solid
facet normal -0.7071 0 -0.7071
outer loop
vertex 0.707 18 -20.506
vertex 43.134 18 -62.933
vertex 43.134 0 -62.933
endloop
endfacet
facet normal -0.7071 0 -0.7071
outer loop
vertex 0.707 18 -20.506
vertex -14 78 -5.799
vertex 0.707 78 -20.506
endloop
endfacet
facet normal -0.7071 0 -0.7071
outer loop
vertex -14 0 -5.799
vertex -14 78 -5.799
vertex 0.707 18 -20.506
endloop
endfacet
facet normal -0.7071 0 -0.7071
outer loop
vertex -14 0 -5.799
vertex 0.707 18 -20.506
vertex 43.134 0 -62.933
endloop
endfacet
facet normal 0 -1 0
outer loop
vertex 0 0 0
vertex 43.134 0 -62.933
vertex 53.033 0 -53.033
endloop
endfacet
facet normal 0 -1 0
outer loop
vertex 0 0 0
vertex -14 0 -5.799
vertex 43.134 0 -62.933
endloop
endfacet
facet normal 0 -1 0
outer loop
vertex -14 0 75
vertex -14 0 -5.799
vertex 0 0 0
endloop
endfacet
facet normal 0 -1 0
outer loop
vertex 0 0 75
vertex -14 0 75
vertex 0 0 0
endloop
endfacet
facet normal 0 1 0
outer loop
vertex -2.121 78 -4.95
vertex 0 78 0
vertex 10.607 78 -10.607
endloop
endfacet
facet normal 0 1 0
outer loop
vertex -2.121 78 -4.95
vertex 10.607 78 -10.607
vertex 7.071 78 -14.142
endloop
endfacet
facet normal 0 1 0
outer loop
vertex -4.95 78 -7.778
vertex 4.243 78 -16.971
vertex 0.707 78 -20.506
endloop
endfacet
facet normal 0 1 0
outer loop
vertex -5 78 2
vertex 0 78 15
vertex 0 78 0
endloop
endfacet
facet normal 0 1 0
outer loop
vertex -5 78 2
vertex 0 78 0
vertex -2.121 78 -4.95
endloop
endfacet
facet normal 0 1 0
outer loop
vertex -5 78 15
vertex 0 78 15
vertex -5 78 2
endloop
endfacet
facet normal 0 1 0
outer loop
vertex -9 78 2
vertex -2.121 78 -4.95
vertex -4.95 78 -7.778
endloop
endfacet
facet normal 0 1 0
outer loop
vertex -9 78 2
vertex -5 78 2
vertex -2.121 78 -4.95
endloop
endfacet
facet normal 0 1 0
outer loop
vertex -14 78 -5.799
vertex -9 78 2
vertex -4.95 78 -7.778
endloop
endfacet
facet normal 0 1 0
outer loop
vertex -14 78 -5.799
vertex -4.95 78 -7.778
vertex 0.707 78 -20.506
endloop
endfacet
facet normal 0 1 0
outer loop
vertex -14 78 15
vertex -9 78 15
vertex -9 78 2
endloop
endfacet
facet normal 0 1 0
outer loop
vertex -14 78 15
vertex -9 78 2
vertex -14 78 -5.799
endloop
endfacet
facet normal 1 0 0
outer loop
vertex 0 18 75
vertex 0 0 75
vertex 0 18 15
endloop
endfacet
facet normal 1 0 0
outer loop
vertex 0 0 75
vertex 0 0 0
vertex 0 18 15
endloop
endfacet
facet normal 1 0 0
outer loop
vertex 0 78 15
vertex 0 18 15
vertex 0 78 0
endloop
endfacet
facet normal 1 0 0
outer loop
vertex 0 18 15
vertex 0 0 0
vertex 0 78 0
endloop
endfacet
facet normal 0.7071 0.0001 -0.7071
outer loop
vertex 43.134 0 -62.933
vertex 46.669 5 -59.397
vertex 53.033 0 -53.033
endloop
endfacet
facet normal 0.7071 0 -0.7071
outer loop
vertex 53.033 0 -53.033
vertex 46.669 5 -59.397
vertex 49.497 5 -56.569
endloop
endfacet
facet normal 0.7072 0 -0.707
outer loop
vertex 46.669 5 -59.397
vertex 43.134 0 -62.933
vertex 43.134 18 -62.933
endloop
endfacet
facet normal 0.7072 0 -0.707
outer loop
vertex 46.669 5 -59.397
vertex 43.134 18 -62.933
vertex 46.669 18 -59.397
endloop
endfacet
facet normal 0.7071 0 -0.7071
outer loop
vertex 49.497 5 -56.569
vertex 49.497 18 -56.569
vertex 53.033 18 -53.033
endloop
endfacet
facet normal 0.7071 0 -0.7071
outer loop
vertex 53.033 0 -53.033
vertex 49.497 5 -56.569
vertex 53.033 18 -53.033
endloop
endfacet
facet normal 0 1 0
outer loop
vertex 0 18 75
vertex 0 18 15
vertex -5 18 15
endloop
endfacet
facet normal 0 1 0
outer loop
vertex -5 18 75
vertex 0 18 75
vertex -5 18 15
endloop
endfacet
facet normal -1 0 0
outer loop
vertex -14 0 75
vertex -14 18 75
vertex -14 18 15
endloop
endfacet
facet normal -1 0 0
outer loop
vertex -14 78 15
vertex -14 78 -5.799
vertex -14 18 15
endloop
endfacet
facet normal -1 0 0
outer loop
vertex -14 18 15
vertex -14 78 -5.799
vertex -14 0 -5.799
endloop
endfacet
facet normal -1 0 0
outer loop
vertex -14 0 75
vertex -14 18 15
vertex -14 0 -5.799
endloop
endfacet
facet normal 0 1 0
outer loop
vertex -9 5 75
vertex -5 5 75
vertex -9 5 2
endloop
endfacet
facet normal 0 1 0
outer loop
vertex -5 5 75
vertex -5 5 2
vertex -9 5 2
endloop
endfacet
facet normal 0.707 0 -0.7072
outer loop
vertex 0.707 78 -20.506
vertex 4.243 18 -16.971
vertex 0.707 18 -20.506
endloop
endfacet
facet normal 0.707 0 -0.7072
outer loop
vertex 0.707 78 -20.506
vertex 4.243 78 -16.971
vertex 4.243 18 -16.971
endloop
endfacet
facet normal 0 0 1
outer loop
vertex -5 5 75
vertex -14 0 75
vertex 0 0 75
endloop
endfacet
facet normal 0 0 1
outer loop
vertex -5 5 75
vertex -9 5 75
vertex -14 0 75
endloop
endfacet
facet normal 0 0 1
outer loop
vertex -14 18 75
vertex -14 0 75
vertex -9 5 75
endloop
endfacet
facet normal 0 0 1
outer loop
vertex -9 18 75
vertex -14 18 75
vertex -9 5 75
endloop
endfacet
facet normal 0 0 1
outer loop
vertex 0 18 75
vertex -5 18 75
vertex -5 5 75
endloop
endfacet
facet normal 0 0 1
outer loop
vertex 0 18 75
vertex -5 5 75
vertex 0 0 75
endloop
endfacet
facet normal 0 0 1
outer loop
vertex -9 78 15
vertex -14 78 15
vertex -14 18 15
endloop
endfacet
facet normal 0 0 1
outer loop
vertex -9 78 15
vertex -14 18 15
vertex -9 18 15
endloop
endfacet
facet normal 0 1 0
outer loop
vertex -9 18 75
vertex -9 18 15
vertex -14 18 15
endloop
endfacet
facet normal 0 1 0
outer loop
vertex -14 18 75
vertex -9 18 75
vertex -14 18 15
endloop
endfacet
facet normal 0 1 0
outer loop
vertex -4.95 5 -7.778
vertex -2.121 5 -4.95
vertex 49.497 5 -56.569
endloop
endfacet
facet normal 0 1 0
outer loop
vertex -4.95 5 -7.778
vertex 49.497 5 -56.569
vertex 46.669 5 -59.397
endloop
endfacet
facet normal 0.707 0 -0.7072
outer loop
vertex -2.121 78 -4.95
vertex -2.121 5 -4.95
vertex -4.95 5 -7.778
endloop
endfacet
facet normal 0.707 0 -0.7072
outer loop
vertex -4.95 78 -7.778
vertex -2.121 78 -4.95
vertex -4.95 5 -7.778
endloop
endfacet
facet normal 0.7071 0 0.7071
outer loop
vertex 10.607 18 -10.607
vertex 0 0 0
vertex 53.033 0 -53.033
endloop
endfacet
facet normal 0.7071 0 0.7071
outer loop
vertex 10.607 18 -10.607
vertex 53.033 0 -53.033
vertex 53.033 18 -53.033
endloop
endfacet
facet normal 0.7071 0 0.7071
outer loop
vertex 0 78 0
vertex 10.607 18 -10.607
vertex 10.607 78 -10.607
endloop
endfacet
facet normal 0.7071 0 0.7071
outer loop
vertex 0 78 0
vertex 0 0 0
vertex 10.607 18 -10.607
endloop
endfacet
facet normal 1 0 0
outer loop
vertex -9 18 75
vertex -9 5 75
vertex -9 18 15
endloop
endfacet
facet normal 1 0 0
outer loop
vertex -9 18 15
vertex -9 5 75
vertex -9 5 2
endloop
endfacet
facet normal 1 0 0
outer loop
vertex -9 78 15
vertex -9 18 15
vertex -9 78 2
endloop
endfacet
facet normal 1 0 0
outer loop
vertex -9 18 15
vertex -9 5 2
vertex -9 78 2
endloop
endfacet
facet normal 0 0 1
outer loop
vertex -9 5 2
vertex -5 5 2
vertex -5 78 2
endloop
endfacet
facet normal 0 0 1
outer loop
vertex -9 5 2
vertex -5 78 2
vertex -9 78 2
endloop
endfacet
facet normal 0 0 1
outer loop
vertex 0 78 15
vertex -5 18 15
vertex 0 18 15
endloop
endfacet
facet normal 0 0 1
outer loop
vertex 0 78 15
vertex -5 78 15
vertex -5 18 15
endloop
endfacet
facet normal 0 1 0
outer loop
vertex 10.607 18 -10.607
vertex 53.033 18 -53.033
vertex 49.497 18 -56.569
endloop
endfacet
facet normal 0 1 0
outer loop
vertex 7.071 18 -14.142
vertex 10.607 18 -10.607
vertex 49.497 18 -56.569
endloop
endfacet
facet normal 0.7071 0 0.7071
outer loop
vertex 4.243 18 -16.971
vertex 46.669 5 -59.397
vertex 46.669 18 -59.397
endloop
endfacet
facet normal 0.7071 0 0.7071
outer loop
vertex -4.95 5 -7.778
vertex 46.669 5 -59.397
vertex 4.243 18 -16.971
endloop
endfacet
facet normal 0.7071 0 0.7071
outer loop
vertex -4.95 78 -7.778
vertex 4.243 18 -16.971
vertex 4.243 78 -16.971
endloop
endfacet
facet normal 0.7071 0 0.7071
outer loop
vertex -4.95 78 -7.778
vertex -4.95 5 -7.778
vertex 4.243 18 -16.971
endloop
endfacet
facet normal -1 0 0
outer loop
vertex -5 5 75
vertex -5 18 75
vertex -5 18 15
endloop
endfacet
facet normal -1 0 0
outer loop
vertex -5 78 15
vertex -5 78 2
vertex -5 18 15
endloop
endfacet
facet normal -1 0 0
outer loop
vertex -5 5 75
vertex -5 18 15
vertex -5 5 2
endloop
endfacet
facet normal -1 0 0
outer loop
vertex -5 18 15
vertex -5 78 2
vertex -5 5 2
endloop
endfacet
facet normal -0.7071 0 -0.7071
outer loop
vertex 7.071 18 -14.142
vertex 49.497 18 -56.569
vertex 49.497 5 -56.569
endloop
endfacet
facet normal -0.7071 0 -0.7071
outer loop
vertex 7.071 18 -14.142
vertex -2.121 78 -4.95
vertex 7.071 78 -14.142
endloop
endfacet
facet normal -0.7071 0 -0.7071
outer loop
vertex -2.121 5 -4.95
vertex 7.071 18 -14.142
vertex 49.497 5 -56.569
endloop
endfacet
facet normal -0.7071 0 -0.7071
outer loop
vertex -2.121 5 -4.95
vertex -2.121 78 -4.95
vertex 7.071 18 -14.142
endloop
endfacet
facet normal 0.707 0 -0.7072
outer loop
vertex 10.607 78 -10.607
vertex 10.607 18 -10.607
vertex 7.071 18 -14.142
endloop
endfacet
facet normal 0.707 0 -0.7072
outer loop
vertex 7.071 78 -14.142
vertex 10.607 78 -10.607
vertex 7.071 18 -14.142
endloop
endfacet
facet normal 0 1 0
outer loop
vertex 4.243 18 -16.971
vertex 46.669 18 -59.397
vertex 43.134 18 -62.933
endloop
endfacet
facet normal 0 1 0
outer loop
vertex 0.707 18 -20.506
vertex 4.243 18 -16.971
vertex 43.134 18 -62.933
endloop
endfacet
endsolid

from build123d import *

# Parameters (mm, degrees)
BOSS_EXTRUDE1_DEPTH = 78
SKETCH4_W           = 4
SKETCH4_H           = 5
BOSS_EXTRUDE2_DEPTH = 13
SKETCH5_W           = 4
SKETCH5_H           = 5
BOSS_EXTRUDE3_DEPTH = 13
BOSS_EXTRUDE6_DEPTH = 60


with BuildPart() as part:
    # Sketch2 → Boss-Extrude1 (new body)
    with BuildSketch(Plane(origin=(0, 0, 0), x_dir=(1, 0, 0), z_dir=(0, 1, 0))):
        Polygon((0, 0), (0, -15), (-5, -15), (-5, -2), (-9, -2), (-9, -15), (-14, -15), (-14, 5.798989873), align=None)
    boss_extrude1 = extrude(amount=BOSS_EXTRUDE1_DEPTH)

    # Mirror1: Boss-Extrude1 across plane
    add(boss_extrude1.mirror(Plane(origin=(0, 78, 0), x_dir=(0.9238795325112891, 0, 0.382683432365084), z_dir=(-0.382683432365084, 0, 0.9238795325112892))))

    # Sketch4 → Boss-Extrude2 (add)
    with BuildSketch(Plane(origin=(1.414213562, 0, -1.414213562), x_dir=(-0.7071067811865562, 0, -0.7071067811865389), z_dir=(0.7071067811865389, 0, -0.7071067811865562))):
        with Locations((7, 2.5)):
            Rectangle(SKETCH4_W, SKETCH4_H)
    extrude(amount=BOSS_EXTRUDE2_DEPTH)

    # Sketch5 → Boss-Extrude3 (add)
    with BuildSketch(Plane.XY.offset(2)):
        with Locations((-7, 2.5)):
            Rectangle(SKETCH5_W, SKETCH5_H)
    extrude(amount=BOSS_EXTRUDE3_DEPTH)

    # Sketch14 → Boss-Extrude6 (add)
    with BuildSketch(Plane.XY.offset(15)):
        Polygon((-14, 0), (0, 0), (0, 18), (-5, 18), (-5, 5), (-9, 5), (-9, 18), (-14, 18), align=None)
    boss_extrude6 = extrude(amount=BOSS_EXTRUDE6_DEPTH)

    # Mirror2: Boss-Extrude6 across plane
    add(boss_extrude6.mirror(Plane(origin=(0, 0, 0), x_dir=(0.9238795325112891, 0, 0.3826834323650842), z_dir=(-0.3826834323650841, 0, 0.9238795325112892))))


solid = part.part
